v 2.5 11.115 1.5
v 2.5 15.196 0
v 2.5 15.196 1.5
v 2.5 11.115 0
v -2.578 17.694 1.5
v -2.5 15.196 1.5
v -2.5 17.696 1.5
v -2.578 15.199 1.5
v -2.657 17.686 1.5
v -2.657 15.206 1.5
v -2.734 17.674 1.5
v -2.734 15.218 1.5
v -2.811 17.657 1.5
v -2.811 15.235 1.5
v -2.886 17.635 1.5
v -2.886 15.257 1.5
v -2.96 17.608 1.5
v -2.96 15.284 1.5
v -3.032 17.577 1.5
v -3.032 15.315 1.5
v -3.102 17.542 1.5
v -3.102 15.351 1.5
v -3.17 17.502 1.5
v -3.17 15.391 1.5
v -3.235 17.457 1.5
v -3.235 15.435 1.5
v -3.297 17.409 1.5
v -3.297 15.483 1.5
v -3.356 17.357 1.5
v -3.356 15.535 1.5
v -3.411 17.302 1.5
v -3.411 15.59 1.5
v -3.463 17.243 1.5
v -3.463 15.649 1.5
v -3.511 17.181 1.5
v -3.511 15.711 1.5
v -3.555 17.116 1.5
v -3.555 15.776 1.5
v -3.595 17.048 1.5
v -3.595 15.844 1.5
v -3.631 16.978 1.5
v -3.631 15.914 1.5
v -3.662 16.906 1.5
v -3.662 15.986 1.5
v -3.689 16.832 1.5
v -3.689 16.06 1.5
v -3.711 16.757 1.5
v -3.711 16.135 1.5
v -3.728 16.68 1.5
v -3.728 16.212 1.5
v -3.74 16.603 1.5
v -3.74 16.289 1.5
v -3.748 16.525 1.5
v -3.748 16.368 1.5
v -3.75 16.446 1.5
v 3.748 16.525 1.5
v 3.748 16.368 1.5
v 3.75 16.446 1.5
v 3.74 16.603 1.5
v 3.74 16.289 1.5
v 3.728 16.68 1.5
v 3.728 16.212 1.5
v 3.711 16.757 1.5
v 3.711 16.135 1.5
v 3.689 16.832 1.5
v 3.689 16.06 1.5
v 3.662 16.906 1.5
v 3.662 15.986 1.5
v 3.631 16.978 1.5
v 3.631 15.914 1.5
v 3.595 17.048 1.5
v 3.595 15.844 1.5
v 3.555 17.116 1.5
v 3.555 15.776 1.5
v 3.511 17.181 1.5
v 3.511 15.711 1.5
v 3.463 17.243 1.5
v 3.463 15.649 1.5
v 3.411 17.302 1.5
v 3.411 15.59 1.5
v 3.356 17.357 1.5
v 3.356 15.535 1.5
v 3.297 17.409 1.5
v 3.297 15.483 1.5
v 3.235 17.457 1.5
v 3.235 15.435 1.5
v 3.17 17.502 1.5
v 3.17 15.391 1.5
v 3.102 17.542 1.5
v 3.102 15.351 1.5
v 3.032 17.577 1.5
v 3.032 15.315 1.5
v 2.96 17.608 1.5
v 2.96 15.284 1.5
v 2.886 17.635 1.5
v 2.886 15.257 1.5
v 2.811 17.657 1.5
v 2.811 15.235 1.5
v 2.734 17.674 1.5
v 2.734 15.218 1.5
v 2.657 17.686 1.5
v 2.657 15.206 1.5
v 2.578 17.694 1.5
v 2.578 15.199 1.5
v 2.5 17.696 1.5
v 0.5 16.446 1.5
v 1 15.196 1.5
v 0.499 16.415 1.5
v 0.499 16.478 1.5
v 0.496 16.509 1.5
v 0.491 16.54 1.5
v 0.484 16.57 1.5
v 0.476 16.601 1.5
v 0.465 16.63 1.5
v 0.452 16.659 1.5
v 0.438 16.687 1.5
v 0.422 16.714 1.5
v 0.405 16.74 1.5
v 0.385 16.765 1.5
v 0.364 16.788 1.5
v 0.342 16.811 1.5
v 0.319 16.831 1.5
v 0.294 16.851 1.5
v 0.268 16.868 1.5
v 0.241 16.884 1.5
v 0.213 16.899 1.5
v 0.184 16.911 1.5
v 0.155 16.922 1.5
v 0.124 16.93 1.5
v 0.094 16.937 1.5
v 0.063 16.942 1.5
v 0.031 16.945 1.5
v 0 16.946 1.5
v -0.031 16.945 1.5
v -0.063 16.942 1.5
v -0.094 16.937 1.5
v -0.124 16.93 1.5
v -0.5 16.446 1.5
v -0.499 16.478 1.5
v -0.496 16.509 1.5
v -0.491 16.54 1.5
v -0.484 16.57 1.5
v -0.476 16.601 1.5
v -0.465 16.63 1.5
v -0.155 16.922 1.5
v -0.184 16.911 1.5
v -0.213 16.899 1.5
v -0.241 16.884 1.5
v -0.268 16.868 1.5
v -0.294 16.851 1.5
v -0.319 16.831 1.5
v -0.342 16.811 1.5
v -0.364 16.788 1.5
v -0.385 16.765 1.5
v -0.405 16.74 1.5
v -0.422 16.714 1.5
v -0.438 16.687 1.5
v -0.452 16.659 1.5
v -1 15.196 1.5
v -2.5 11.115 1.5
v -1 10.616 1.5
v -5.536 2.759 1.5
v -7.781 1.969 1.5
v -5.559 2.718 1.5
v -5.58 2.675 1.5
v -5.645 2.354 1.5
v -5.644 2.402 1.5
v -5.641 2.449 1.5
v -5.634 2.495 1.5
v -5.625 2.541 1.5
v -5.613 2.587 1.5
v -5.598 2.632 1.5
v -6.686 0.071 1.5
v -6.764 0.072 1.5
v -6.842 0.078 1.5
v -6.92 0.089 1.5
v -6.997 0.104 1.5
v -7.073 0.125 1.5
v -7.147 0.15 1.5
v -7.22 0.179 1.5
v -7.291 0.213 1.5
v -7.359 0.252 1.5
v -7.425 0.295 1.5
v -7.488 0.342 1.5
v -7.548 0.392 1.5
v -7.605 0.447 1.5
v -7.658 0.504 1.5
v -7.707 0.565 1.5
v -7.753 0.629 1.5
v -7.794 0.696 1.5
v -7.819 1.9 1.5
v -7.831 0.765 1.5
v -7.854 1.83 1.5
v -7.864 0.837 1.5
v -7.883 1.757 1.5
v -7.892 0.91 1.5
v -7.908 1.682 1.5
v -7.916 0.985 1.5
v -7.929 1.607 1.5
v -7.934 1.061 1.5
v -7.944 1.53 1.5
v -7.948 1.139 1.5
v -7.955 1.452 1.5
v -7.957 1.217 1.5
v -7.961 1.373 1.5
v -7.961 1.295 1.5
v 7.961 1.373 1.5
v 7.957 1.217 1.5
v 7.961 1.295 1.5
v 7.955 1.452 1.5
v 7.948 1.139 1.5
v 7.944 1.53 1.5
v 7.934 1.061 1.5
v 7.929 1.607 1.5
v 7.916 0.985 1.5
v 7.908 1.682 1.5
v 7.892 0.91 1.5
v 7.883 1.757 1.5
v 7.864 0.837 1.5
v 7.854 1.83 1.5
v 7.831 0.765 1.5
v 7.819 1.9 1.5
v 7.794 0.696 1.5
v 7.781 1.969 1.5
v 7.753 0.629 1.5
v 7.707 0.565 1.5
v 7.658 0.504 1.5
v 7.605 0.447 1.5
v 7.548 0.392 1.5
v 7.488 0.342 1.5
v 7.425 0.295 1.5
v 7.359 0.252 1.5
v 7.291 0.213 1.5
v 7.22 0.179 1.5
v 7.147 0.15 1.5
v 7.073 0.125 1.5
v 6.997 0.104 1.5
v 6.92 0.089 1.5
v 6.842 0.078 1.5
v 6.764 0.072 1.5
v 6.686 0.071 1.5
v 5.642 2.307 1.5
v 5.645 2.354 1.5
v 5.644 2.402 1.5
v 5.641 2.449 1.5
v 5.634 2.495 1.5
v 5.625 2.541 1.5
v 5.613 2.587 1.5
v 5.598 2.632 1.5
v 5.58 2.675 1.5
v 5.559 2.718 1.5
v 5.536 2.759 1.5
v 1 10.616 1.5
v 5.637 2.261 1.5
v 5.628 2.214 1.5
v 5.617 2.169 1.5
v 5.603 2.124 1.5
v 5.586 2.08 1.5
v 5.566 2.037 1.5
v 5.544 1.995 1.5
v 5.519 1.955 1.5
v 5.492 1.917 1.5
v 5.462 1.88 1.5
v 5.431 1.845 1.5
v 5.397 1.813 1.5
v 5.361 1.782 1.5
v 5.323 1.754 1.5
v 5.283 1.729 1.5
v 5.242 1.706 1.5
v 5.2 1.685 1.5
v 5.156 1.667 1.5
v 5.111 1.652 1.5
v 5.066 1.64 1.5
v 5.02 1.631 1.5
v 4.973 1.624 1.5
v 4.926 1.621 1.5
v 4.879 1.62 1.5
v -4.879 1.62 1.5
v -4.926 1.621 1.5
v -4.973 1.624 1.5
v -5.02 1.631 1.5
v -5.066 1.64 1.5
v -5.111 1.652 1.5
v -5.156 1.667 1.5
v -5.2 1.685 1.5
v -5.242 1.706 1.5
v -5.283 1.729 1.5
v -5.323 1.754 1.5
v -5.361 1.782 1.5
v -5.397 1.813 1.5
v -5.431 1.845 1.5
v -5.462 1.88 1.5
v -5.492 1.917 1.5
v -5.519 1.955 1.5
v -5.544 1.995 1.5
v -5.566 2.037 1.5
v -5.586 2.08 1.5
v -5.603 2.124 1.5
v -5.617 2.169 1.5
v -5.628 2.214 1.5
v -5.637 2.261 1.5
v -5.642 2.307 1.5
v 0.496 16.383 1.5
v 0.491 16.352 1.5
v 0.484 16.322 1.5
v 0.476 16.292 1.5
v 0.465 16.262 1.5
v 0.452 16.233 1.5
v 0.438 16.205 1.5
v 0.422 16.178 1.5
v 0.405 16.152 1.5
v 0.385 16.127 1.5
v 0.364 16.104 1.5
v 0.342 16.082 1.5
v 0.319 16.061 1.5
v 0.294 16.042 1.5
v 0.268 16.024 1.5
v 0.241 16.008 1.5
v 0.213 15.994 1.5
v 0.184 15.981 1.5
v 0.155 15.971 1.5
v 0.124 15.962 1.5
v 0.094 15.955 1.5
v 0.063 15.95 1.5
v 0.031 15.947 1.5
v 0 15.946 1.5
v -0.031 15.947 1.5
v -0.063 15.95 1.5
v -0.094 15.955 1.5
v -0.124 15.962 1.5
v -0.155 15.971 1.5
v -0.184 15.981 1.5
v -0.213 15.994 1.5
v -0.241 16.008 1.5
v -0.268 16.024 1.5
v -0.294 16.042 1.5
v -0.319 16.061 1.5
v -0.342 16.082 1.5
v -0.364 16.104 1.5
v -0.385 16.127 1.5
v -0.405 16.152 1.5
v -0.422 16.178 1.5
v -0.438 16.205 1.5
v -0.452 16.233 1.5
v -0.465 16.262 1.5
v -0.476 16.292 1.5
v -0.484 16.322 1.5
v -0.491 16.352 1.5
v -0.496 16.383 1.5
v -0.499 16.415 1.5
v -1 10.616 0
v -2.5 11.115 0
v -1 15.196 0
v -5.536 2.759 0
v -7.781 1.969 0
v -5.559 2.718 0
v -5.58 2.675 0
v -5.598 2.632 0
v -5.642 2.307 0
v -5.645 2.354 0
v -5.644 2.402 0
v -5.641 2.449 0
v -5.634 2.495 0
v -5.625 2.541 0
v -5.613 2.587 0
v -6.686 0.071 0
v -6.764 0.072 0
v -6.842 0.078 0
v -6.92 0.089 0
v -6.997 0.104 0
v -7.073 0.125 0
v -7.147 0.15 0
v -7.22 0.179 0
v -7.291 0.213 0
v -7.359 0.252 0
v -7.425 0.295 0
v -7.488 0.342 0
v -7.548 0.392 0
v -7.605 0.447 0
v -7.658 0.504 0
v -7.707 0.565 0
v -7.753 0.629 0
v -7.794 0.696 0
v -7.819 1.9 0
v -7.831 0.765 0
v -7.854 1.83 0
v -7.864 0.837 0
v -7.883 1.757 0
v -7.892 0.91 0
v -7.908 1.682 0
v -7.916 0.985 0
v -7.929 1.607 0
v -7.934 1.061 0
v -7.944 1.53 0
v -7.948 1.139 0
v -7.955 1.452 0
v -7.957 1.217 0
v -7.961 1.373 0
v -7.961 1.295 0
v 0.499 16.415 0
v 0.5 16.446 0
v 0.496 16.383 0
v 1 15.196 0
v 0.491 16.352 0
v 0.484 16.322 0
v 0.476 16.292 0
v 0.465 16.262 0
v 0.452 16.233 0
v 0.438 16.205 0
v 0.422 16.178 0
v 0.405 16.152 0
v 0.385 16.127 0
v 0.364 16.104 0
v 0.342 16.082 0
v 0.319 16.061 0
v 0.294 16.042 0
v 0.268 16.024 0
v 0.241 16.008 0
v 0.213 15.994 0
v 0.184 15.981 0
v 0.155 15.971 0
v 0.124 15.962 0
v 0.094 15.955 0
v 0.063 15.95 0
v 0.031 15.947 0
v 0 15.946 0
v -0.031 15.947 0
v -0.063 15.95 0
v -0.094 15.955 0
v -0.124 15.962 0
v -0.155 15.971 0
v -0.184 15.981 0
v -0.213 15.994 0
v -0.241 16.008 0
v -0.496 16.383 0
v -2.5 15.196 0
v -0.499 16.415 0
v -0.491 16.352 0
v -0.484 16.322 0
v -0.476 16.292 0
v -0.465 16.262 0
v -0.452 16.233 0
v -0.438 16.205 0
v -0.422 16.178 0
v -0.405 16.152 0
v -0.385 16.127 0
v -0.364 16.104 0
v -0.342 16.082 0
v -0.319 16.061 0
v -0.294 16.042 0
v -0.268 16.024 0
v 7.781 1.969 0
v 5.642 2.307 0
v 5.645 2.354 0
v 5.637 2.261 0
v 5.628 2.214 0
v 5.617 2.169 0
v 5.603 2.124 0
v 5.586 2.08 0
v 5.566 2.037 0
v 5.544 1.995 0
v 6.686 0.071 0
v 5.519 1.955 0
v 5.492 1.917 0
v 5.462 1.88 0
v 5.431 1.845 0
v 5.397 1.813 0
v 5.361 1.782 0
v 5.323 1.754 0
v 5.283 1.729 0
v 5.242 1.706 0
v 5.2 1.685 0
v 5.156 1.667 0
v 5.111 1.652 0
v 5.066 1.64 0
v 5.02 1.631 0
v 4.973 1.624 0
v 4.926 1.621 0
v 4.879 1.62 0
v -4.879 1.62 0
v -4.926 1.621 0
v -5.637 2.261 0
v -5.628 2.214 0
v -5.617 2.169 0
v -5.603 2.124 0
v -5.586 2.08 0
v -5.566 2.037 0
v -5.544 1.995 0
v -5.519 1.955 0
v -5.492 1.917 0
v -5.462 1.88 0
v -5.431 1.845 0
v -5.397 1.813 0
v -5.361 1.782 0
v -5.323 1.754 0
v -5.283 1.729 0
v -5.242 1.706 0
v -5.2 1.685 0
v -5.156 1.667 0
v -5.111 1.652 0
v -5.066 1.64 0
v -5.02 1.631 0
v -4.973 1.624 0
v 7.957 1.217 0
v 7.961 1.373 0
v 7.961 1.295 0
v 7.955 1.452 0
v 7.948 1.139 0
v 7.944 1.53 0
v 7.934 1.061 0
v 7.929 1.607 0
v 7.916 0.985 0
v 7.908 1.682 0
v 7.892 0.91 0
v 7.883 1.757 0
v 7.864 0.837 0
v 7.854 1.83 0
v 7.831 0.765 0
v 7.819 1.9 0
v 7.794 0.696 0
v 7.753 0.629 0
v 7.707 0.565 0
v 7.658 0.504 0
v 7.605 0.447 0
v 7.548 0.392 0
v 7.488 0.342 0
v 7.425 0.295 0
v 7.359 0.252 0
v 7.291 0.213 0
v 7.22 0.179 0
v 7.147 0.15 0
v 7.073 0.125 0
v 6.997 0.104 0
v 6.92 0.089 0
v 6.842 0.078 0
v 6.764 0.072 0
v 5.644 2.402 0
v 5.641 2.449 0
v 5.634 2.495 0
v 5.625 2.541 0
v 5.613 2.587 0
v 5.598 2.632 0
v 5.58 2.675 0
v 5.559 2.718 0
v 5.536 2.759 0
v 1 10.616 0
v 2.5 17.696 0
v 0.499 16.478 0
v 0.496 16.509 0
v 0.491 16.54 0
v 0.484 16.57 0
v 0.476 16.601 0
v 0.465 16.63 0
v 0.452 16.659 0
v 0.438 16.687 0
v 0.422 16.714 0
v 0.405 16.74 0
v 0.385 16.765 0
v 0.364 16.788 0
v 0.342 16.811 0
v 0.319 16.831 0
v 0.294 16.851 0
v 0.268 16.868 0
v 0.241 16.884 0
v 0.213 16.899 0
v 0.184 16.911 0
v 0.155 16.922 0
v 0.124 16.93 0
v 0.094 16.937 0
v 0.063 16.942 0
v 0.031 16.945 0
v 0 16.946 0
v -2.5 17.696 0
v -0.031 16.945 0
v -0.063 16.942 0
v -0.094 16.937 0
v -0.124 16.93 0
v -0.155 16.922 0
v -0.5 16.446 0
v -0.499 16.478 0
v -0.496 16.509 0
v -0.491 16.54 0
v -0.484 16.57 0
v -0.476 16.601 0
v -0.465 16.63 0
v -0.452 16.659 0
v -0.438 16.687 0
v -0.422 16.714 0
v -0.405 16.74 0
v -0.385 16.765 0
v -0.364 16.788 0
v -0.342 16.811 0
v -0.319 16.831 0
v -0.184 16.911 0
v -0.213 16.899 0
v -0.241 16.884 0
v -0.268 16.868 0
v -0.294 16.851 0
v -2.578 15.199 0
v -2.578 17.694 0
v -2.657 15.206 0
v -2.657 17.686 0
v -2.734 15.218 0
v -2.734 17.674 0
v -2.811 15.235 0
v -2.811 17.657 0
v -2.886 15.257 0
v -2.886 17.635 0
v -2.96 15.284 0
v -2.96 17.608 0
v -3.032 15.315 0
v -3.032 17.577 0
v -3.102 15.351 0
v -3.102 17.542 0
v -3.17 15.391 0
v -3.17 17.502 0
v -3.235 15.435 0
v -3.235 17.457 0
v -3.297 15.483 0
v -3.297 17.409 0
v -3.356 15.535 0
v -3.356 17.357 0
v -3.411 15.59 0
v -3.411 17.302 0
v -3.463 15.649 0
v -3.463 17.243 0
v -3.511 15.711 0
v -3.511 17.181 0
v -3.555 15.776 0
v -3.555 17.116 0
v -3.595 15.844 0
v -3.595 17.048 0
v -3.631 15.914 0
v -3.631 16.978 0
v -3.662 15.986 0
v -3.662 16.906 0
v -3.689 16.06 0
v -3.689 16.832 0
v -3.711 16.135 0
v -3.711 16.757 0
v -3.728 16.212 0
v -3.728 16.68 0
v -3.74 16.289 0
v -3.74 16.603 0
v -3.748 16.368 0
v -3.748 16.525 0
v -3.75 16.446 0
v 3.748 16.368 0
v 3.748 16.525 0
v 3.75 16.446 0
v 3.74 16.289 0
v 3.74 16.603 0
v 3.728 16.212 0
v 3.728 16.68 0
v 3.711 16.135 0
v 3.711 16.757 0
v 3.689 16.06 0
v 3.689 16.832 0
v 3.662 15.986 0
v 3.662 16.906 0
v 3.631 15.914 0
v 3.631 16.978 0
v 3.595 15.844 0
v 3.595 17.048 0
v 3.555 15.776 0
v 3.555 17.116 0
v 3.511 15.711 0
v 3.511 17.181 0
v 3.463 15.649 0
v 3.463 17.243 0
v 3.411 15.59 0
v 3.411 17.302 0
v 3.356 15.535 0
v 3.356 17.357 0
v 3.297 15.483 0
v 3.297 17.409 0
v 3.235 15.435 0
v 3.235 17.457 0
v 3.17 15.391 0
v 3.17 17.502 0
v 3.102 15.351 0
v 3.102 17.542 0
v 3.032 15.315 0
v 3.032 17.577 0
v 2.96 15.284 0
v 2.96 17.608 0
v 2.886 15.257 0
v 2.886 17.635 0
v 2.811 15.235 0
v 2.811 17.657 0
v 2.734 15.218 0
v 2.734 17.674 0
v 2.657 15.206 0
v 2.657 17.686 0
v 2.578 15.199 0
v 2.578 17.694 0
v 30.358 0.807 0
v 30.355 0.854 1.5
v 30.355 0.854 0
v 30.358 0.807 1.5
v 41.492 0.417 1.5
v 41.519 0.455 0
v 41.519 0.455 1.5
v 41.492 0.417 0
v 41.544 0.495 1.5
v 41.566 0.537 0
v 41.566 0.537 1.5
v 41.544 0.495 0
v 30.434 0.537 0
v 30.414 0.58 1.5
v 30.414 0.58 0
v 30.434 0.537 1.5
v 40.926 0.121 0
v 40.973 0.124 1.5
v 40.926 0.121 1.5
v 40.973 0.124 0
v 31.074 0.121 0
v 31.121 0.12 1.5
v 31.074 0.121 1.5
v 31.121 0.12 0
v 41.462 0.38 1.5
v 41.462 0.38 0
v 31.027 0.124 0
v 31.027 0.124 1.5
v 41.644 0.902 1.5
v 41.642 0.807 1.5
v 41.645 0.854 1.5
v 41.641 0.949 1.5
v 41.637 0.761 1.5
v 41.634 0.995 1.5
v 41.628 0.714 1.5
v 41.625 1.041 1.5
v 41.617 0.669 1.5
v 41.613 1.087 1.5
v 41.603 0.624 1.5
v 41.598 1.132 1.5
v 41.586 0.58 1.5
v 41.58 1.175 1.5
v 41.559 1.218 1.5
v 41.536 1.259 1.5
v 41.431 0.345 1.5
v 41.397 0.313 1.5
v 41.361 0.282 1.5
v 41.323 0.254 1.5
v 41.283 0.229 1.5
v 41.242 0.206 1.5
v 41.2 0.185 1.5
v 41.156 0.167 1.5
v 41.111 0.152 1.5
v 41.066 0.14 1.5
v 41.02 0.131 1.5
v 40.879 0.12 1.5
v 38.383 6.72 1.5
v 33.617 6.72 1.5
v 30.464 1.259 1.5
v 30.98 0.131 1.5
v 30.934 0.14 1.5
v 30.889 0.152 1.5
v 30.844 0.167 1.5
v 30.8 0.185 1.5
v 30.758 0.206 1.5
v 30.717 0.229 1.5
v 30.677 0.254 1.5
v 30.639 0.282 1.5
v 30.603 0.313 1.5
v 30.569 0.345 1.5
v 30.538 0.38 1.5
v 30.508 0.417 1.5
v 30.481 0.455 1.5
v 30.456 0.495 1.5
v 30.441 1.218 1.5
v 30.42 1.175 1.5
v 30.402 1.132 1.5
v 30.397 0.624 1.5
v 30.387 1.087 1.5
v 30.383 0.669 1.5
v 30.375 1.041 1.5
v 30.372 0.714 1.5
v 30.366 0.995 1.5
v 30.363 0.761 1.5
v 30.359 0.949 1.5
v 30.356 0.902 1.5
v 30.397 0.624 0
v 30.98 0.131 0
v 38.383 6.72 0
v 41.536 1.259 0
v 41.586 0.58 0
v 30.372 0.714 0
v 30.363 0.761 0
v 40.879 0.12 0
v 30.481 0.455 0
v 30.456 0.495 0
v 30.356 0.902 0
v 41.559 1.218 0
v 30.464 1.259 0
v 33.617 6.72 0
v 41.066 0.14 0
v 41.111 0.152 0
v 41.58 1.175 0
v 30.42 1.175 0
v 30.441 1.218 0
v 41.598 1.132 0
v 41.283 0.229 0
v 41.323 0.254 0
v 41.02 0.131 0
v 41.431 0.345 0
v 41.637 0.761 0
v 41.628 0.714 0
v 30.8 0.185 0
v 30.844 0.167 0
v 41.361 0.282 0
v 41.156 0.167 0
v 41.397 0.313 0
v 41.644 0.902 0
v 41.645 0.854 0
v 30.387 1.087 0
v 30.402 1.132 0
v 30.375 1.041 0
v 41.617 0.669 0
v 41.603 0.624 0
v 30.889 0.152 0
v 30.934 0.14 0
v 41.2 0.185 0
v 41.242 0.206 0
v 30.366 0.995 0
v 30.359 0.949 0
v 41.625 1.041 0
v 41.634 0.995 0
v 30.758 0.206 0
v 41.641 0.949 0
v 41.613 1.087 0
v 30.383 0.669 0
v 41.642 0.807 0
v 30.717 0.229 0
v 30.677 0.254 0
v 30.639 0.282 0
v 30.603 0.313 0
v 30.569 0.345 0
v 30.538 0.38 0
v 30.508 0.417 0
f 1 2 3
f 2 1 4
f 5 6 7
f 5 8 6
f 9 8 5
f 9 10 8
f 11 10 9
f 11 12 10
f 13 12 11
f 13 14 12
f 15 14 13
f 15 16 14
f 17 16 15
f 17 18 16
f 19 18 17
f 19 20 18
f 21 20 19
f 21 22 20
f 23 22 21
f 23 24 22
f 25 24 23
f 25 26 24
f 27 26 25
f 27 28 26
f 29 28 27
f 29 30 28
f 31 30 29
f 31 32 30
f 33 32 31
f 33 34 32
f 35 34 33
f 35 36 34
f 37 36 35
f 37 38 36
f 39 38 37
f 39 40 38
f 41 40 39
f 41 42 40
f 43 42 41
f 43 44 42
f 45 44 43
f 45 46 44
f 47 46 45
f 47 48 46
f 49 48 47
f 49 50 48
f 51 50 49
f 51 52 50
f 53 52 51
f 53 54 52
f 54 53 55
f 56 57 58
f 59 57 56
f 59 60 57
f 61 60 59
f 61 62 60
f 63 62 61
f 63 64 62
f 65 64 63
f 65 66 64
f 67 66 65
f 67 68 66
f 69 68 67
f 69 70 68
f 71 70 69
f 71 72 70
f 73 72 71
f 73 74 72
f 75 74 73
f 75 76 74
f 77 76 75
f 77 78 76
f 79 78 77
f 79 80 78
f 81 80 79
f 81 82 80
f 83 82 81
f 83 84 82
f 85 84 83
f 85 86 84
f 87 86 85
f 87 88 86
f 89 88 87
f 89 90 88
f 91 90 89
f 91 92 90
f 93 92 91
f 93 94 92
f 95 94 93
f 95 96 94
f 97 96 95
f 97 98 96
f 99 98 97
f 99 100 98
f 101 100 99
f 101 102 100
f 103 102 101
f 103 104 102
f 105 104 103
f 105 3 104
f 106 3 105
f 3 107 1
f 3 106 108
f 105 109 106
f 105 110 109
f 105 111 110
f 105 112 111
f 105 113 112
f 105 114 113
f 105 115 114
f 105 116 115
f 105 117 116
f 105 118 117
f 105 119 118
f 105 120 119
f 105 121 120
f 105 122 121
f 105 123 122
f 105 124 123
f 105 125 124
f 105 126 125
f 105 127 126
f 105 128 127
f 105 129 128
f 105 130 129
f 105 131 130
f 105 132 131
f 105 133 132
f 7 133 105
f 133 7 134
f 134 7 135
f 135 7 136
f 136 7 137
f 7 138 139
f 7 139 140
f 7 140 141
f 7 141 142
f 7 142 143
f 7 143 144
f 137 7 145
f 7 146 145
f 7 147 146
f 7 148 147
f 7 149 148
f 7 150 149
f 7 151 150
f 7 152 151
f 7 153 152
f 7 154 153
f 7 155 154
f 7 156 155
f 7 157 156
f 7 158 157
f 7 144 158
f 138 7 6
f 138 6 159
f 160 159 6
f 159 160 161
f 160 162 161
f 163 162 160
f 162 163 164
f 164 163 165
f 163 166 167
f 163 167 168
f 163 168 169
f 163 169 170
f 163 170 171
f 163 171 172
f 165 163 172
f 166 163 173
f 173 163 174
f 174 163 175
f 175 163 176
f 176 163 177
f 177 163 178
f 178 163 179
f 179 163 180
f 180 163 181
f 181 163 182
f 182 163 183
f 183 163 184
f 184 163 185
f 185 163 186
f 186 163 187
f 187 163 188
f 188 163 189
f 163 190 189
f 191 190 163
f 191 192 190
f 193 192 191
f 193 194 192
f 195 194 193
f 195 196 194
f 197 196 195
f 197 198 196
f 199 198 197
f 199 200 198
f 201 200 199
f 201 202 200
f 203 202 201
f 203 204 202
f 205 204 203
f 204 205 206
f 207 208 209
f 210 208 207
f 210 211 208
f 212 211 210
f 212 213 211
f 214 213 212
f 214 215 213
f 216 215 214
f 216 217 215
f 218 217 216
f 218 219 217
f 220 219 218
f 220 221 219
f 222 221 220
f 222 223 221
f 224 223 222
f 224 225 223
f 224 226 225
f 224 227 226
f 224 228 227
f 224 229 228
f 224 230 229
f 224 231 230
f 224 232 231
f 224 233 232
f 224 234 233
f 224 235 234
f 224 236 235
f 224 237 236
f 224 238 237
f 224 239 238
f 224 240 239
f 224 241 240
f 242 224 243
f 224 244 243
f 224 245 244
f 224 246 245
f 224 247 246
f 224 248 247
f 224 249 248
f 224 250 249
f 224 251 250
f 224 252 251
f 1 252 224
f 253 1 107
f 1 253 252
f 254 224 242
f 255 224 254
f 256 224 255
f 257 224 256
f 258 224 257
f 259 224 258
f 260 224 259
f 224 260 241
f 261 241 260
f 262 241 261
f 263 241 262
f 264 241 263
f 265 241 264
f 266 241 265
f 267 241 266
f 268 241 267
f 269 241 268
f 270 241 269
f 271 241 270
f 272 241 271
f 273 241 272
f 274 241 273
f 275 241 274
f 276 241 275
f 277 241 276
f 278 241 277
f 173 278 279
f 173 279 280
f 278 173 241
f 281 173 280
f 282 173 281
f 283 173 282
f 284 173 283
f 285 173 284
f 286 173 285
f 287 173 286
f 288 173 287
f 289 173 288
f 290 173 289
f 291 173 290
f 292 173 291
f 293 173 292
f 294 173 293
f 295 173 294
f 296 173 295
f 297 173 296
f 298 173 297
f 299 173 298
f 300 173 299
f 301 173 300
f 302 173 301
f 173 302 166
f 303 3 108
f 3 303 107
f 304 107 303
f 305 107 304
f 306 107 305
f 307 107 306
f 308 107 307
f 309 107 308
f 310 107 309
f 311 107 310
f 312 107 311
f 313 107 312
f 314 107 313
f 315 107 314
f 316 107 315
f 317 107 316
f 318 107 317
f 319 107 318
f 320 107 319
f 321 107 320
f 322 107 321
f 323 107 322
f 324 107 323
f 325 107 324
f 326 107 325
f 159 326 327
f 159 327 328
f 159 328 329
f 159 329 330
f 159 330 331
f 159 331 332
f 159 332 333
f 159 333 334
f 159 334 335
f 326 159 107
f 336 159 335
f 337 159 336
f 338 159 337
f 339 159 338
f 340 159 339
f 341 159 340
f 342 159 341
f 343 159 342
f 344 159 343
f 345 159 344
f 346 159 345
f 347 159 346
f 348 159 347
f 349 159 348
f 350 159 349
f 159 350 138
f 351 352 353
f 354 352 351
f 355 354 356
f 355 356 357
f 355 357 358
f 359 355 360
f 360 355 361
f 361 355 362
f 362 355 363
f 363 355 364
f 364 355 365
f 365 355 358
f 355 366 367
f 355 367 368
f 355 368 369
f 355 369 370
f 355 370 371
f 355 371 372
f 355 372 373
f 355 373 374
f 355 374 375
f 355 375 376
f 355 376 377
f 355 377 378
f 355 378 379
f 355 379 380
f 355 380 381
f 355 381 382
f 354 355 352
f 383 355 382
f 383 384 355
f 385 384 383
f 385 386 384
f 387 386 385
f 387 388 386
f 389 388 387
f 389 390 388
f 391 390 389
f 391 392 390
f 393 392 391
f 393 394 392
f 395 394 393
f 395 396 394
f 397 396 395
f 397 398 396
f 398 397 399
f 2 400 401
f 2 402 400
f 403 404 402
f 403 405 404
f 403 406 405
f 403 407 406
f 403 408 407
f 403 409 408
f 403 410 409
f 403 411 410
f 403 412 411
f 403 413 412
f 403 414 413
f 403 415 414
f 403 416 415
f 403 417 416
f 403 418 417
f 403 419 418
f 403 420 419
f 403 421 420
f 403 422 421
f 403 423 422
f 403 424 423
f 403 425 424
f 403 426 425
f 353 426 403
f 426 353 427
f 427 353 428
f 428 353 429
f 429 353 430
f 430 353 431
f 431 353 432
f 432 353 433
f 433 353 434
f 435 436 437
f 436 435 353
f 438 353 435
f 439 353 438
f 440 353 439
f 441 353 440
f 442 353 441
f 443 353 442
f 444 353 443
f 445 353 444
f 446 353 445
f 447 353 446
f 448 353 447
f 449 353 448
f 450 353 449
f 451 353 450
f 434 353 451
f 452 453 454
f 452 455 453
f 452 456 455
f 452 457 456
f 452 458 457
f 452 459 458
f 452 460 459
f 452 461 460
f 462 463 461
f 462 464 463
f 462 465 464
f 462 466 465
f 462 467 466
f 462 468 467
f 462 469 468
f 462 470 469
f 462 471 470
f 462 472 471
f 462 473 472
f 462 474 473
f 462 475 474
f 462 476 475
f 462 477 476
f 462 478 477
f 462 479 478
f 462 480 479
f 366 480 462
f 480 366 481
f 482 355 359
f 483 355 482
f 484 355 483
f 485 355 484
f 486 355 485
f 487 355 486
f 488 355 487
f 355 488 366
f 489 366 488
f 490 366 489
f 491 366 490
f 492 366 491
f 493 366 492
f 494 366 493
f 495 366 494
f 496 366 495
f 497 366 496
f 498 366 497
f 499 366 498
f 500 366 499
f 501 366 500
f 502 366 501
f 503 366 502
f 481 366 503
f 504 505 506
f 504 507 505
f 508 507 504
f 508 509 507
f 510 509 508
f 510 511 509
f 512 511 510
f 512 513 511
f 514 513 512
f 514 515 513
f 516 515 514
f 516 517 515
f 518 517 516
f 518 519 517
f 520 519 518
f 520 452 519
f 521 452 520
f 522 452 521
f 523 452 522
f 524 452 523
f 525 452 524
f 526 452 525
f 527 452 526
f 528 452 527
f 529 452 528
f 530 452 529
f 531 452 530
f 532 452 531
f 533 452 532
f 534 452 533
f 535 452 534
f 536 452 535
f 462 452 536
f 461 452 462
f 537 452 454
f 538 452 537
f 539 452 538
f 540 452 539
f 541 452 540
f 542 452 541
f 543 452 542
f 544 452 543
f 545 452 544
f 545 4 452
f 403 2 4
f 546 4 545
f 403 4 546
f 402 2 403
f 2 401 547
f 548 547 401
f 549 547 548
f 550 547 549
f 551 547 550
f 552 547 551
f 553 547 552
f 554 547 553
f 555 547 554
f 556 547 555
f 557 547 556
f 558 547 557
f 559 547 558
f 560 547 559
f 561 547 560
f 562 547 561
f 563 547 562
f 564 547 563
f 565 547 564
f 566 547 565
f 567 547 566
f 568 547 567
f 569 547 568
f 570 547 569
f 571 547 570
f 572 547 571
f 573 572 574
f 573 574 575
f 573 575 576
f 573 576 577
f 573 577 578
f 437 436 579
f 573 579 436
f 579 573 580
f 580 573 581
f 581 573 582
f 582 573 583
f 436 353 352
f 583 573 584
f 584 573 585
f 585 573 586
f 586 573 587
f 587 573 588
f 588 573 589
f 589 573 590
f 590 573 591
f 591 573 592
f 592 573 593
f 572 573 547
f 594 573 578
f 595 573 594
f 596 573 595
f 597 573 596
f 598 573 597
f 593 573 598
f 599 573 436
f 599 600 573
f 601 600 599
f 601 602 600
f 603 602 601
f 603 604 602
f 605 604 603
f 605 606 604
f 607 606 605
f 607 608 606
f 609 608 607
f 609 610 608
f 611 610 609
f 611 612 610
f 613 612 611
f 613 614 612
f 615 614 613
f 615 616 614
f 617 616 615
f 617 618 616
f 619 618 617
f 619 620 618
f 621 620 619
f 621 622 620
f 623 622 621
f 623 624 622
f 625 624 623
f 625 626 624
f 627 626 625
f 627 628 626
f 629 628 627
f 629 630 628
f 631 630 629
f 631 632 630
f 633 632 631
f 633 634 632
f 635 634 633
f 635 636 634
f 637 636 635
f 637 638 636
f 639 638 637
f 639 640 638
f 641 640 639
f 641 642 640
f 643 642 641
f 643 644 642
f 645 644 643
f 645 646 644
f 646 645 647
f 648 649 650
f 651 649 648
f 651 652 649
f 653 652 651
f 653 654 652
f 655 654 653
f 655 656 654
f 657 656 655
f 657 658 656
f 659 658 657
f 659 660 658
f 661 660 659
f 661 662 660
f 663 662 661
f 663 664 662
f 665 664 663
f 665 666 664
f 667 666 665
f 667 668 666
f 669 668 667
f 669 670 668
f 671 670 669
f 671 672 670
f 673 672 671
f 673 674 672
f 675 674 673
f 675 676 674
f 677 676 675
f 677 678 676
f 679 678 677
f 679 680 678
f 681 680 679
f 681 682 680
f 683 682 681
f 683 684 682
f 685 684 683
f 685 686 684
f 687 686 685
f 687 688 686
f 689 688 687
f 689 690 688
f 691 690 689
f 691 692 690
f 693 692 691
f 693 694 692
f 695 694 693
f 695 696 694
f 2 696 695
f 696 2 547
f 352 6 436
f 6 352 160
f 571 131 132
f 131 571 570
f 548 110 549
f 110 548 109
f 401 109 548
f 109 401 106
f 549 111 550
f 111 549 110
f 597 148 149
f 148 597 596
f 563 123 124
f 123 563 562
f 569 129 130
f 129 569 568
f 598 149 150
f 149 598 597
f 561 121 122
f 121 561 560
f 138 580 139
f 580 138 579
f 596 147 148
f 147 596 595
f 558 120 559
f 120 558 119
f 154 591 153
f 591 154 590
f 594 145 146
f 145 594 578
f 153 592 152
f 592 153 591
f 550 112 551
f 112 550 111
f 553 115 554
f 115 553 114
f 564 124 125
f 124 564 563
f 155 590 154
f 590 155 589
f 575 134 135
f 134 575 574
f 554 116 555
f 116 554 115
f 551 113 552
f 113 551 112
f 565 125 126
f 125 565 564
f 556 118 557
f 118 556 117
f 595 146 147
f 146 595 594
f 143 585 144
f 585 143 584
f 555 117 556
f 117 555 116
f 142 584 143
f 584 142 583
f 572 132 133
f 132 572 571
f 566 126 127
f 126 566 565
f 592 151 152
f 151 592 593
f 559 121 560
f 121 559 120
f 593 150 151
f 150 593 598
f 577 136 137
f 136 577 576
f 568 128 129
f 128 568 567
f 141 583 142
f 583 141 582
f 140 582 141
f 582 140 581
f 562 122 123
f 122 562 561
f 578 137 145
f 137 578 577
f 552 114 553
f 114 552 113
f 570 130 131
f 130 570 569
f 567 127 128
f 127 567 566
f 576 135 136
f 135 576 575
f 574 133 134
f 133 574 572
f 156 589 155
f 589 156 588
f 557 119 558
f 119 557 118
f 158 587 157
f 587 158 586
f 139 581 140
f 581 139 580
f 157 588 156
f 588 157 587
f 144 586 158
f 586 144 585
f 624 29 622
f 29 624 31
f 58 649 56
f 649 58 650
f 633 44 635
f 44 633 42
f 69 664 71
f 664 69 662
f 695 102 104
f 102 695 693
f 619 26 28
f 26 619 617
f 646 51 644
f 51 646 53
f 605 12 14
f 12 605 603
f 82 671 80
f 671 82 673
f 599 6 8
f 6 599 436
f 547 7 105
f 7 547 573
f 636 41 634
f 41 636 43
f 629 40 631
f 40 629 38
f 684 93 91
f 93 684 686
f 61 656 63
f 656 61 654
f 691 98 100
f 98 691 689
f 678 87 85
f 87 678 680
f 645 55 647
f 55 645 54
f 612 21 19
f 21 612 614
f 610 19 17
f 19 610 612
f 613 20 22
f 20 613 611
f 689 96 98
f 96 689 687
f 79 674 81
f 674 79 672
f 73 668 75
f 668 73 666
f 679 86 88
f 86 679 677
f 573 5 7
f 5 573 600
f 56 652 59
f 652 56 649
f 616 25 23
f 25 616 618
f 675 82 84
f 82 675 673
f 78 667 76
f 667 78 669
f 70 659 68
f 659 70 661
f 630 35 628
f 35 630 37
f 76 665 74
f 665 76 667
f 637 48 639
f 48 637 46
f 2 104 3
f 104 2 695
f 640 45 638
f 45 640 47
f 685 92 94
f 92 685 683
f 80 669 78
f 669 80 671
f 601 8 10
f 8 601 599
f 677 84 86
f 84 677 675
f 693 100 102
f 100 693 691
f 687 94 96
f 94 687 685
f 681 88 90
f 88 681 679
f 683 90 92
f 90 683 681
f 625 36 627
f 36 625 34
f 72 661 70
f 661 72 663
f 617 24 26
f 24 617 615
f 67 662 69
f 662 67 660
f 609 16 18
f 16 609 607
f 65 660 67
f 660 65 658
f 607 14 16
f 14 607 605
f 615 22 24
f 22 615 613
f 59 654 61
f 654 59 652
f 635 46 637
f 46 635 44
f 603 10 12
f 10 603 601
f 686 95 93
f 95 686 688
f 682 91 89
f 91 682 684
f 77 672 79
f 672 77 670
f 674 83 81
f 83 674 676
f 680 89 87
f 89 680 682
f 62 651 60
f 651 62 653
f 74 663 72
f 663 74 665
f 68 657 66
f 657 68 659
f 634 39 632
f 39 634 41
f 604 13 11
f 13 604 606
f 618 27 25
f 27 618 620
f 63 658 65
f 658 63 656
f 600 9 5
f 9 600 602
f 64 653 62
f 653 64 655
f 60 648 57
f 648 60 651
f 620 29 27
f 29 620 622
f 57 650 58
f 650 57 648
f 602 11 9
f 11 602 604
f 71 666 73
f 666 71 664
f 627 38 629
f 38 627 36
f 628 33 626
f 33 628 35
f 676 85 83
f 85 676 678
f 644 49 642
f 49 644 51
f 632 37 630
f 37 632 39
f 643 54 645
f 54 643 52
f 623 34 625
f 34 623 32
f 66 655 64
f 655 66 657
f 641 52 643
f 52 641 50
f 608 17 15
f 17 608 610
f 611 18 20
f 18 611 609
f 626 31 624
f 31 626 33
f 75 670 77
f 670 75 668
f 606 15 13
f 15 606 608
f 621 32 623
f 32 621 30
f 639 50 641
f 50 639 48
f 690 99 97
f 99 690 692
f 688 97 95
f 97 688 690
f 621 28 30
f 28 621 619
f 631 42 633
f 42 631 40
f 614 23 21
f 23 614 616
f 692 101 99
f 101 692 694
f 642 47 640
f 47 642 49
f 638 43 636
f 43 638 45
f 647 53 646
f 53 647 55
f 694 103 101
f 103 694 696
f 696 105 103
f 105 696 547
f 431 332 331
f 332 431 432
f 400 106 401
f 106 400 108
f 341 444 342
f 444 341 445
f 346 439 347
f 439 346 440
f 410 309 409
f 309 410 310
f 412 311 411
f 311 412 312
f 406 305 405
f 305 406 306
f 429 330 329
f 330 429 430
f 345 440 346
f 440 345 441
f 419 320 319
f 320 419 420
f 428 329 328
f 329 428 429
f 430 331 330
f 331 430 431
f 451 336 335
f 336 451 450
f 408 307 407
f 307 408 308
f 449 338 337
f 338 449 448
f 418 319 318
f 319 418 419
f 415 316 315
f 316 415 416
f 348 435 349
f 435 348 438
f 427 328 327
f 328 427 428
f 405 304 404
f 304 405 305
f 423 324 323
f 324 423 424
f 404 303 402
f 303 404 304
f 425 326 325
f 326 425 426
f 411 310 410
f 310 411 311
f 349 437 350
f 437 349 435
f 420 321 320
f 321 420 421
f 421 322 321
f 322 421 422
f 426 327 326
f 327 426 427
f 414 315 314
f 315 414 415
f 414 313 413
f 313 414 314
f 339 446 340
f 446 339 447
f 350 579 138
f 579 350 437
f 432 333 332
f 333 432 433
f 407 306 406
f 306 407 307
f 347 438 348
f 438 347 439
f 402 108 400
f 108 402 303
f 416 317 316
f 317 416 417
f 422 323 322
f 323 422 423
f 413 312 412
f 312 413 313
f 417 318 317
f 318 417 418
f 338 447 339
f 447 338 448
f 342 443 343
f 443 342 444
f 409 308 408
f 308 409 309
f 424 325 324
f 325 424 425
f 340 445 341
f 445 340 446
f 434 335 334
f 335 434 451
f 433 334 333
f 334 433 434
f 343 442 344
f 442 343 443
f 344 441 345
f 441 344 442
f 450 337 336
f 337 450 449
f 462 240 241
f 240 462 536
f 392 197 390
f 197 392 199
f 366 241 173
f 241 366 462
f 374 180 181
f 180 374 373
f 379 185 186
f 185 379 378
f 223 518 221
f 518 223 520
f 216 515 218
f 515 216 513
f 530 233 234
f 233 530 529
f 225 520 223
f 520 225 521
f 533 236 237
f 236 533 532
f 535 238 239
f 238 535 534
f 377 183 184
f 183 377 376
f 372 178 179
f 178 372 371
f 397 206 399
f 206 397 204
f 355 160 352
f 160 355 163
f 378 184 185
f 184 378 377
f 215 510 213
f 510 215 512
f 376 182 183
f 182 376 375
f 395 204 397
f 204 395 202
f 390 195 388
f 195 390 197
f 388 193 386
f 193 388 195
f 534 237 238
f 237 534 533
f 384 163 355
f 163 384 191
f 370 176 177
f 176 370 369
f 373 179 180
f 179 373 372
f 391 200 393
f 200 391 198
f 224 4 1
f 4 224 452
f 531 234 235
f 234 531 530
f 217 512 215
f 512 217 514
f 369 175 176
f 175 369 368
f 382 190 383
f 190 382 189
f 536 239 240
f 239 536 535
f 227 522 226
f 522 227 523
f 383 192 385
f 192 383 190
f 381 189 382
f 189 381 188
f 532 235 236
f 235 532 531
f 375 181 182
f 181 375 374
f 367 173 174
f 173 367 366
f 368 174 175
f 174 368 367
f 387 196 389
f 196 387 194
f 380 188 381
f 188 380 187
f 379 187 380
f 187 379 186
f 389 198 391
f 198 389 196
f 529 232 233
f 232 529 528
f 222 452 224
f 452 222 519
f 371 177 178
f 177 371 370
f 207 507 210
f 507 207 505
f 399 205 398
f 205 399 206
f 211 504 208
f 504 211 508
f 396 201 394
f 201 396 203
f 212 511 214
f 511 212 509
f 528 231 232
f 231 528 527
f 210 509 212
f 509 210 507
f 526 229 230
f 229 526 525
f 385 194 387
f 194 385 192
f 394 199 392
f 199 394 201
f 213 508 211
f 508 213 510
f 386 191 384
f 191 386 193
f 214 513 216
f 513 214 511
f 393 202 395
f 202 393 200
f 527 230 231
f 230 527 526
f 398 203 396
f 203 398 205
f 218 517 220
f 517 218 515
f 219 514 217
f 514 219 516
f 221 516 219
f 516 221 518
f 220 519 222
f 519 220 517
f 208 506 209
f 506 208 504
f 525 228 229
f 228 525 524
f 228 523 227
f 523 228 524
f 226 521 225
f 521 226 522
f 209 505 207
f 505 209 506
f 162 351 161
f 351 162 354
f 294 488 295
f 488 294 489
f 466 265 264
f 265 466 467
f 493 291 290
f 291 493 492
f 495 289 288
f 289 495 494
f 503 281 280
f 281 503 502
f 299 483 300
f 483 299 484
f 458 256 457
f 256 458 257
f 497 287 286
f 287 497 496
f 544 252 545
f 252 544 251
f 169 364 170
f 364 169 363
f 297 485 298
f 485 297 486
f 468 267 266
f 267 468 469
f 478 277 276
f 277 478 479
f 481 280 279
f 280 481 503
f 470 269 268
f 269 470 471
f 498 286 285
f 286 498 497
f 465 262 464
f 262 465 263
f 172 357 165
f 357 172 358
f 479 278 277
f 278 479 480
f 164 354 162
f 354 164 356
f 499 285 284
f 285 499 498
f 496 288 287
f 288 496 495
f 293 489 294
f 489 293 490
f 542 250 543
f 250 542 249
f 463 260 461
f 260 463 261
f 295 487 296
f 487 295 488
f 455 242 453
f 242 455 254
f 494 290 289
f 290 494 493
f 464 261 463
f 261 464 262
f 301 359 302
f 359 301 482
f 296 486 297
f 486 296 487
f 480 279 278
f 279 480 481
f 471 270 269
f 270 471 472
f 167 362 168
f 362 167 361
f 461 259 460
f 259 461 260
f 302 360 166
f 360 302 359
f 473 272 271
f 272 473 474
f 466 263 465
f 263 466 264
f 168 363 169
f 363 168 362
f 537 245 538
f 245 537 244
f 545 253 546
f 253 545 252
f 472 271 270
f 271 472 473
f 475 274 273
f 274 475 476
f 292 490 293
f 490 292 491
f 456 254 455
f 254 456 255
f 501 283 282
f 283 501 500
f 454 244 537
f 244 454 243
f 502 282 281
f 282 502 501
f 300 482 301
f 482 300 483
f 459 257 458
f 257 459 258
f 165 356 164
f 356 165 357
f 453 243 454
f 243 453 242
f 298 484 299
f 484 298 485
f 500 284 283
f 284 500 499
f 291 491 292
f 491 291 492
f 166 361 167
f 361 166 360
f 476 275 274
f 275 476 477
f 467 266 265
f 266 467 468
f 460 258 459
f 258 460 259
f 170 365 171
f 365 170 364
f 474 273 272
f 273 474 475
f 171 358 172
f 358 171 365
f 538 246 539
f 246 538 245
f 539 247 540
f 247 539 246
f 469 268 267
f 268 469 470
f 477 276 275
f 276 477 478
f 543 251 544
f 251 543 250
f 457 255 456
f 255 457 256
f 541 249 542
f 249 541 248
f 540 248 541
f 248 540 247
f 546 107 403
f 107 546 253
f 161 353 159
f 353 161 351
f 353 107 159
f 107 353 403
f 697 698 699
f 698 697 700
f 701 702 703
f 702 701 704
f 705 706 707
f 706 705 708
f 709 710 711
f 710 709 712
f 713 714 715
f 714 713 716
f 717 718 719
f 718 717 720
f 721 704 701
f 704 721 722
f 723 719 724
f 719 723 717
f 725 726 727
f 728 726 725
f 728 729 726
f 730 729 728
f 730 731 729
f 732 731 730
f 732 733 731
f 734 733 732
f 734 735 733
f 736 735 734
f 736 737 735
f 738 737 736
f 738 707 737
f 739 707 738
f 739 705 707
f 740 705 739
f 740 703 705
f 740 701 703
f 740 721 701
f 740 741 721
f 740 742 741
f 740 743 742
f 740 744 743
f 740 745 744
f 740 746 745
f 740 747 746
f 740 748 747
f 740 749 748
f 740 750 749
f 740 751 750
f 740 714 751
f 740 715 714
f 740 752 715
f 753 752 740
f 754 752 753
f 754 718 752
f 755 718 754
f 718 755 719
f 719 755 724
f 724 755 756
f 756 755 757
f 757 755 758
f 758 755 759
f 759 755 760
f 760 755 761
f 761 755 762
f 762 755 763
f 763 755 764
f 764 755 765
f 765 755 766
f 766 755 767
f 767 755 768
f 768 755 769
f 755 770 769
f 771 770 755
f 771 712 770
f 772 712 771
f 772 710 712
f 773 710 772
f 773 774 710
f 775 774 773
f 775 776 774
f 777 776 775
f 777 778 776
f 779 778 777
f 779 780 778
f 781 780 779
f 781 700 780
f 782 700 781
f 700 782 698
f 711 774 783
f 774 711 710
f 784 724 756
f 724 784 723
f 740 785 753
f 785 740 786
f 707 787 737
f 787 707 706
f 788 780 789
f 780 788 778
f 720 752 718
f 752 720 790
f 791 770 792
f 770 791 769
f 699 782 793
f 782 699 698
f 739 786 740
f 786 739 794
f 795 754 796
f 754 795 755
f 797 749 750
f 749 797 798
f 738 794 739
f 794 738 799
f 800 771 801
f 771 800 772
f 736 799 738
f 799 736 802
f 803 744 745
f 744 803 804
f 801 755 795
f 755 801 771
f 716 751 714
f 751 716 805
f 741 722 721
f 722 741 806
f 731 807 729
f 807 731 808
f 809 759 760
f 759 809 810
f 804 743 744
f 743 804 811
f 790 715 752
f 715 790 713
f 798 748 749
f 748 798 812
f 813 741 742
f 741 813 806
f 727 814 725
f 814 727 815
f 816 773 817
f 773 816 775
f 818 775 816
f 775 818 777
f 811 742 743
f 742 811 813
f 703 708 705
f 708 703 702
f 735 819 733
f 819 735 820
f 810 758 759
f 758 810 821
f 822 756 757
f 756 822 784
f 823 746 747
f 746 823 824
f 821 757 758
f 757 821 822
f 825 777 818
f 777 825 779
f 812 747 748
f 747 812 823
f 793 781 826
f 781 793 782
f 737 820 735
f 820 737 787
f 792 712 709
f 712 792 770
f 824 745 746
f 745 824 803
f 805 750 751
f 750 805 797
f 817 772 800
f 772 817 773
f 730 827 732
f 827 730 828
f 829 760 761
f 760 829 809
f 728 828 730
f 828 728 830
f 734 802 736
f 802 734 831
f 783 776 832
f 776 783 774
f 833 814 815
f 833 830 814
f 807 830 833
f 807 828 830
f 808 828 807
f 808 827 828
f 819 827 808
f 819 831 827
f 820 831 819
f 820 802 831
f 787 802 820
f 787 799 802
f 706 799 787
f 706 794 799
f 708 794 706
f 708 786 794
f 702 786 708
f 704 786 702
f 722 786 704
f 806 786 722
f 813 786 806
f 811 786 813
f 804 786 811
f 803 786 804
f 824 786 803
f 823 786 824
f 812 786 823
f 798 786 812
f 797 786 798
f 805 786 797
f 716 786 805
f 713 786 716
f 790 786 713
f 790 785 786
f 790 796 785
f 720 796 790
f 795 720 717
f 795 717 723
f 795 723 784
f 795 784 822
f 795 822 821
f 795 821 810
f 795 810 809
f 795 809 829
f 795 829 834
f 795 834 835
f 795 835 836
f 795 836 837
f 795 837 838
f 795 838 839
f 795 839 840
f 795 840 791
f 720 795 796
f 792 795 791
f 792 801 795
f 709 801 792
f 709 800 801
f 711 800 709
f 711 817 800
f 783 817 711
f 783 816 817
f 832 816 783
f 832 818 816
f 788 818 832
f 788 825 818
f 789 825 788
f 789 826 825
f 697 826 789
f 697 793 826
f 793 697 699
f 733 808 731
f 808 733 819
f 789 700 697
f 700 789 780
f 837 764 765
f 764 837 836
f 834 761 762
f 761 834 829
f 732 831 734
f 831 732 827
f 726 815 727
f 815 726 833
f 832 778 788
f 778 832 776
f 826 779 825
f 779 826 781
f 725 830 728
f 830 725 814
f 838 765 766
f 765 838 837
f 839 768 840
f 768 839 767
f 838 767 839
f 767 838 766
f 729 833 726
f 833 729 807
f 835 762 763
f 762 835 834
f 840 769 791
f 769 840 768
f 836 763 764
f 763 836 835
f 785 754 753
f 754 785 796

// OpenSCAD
module grid(){}

module rc_triangle(diam = 2.5, height = 1, a = 5){
    //translate([])
        hull(){
            for(i=[0:2]){
                 rotate([0,0,90+i*120]) translate([a-0.5*diam,0,0]) cylinder(d=diam,h=height); 
            }
        }
}

module neck(length = 10, height = 1, neck_width = 4, thickness = 3){

    difference(){
        translate([-neck_width*0.5,0,0]) cube([neck_width,length,height]);
        translate([0,length-0.75,-0.5*height]) cylinder(h=2*height, d=1); 
    }
    
    translate([0,length-0.75,0]){
        // top flask part
        difference(){
            hull(){
                translate([-neck_width*0.5,0,0]) cylinder(h=height, d=thickness);
                translate([neck_width*0.5,0,0]) cylinder(h=height, d=thickness);
            }
            translate([0,0,-0.5*height]) cylinder(h=2*height, d=1);          
        }
    }
}


module flask(a = 9, neck_length = 12, neck_width = 5, thickness = 1.5,  height = 1.5, d_outer = 2.5, d_inner = 1.5){
    translate([0,(sqrt(3)/3)*a,0])
    difference(){
        union(){
            rc_triangle(height=height, diam=d_outer, a=a);
            neck(height=height,length=neck_length, neck_width=neck_width, thickness=2.5);
        }
        union(){
            translate([0,0,-0.5*height])
                rc_triangle(diam=d_inner,a=a-(3/(sqrt(3))*thickness), height=2*height);
            translate([-0.5*(neck_width-2*thickness),0,-0.5])
                cube([neck_width-2*thickness, neck_length-2,2*height]);
       }
    }
    
    translate([4*a,0,0]){
        water(diam=d_inner, a = a-sqrt(3)*thickness, height=height);
    }
    

}

module water(diam=1.5, a=6-sqrt(3), height=1, multiplicator = 0.65){
    
    difference(){
        translate([0,(1/sqrt(3))*a,0]) rc_triangle(diam=diam,a=a, height=height);
        translate([-a,(multiplicator)*((a*sqrt(3))-0.5*diam),-0.5*height]) cube([2*a,2*a,2*height]);
    }
    
}


$fn = 100;

flask() ;

//#cube([5,1,1]);
